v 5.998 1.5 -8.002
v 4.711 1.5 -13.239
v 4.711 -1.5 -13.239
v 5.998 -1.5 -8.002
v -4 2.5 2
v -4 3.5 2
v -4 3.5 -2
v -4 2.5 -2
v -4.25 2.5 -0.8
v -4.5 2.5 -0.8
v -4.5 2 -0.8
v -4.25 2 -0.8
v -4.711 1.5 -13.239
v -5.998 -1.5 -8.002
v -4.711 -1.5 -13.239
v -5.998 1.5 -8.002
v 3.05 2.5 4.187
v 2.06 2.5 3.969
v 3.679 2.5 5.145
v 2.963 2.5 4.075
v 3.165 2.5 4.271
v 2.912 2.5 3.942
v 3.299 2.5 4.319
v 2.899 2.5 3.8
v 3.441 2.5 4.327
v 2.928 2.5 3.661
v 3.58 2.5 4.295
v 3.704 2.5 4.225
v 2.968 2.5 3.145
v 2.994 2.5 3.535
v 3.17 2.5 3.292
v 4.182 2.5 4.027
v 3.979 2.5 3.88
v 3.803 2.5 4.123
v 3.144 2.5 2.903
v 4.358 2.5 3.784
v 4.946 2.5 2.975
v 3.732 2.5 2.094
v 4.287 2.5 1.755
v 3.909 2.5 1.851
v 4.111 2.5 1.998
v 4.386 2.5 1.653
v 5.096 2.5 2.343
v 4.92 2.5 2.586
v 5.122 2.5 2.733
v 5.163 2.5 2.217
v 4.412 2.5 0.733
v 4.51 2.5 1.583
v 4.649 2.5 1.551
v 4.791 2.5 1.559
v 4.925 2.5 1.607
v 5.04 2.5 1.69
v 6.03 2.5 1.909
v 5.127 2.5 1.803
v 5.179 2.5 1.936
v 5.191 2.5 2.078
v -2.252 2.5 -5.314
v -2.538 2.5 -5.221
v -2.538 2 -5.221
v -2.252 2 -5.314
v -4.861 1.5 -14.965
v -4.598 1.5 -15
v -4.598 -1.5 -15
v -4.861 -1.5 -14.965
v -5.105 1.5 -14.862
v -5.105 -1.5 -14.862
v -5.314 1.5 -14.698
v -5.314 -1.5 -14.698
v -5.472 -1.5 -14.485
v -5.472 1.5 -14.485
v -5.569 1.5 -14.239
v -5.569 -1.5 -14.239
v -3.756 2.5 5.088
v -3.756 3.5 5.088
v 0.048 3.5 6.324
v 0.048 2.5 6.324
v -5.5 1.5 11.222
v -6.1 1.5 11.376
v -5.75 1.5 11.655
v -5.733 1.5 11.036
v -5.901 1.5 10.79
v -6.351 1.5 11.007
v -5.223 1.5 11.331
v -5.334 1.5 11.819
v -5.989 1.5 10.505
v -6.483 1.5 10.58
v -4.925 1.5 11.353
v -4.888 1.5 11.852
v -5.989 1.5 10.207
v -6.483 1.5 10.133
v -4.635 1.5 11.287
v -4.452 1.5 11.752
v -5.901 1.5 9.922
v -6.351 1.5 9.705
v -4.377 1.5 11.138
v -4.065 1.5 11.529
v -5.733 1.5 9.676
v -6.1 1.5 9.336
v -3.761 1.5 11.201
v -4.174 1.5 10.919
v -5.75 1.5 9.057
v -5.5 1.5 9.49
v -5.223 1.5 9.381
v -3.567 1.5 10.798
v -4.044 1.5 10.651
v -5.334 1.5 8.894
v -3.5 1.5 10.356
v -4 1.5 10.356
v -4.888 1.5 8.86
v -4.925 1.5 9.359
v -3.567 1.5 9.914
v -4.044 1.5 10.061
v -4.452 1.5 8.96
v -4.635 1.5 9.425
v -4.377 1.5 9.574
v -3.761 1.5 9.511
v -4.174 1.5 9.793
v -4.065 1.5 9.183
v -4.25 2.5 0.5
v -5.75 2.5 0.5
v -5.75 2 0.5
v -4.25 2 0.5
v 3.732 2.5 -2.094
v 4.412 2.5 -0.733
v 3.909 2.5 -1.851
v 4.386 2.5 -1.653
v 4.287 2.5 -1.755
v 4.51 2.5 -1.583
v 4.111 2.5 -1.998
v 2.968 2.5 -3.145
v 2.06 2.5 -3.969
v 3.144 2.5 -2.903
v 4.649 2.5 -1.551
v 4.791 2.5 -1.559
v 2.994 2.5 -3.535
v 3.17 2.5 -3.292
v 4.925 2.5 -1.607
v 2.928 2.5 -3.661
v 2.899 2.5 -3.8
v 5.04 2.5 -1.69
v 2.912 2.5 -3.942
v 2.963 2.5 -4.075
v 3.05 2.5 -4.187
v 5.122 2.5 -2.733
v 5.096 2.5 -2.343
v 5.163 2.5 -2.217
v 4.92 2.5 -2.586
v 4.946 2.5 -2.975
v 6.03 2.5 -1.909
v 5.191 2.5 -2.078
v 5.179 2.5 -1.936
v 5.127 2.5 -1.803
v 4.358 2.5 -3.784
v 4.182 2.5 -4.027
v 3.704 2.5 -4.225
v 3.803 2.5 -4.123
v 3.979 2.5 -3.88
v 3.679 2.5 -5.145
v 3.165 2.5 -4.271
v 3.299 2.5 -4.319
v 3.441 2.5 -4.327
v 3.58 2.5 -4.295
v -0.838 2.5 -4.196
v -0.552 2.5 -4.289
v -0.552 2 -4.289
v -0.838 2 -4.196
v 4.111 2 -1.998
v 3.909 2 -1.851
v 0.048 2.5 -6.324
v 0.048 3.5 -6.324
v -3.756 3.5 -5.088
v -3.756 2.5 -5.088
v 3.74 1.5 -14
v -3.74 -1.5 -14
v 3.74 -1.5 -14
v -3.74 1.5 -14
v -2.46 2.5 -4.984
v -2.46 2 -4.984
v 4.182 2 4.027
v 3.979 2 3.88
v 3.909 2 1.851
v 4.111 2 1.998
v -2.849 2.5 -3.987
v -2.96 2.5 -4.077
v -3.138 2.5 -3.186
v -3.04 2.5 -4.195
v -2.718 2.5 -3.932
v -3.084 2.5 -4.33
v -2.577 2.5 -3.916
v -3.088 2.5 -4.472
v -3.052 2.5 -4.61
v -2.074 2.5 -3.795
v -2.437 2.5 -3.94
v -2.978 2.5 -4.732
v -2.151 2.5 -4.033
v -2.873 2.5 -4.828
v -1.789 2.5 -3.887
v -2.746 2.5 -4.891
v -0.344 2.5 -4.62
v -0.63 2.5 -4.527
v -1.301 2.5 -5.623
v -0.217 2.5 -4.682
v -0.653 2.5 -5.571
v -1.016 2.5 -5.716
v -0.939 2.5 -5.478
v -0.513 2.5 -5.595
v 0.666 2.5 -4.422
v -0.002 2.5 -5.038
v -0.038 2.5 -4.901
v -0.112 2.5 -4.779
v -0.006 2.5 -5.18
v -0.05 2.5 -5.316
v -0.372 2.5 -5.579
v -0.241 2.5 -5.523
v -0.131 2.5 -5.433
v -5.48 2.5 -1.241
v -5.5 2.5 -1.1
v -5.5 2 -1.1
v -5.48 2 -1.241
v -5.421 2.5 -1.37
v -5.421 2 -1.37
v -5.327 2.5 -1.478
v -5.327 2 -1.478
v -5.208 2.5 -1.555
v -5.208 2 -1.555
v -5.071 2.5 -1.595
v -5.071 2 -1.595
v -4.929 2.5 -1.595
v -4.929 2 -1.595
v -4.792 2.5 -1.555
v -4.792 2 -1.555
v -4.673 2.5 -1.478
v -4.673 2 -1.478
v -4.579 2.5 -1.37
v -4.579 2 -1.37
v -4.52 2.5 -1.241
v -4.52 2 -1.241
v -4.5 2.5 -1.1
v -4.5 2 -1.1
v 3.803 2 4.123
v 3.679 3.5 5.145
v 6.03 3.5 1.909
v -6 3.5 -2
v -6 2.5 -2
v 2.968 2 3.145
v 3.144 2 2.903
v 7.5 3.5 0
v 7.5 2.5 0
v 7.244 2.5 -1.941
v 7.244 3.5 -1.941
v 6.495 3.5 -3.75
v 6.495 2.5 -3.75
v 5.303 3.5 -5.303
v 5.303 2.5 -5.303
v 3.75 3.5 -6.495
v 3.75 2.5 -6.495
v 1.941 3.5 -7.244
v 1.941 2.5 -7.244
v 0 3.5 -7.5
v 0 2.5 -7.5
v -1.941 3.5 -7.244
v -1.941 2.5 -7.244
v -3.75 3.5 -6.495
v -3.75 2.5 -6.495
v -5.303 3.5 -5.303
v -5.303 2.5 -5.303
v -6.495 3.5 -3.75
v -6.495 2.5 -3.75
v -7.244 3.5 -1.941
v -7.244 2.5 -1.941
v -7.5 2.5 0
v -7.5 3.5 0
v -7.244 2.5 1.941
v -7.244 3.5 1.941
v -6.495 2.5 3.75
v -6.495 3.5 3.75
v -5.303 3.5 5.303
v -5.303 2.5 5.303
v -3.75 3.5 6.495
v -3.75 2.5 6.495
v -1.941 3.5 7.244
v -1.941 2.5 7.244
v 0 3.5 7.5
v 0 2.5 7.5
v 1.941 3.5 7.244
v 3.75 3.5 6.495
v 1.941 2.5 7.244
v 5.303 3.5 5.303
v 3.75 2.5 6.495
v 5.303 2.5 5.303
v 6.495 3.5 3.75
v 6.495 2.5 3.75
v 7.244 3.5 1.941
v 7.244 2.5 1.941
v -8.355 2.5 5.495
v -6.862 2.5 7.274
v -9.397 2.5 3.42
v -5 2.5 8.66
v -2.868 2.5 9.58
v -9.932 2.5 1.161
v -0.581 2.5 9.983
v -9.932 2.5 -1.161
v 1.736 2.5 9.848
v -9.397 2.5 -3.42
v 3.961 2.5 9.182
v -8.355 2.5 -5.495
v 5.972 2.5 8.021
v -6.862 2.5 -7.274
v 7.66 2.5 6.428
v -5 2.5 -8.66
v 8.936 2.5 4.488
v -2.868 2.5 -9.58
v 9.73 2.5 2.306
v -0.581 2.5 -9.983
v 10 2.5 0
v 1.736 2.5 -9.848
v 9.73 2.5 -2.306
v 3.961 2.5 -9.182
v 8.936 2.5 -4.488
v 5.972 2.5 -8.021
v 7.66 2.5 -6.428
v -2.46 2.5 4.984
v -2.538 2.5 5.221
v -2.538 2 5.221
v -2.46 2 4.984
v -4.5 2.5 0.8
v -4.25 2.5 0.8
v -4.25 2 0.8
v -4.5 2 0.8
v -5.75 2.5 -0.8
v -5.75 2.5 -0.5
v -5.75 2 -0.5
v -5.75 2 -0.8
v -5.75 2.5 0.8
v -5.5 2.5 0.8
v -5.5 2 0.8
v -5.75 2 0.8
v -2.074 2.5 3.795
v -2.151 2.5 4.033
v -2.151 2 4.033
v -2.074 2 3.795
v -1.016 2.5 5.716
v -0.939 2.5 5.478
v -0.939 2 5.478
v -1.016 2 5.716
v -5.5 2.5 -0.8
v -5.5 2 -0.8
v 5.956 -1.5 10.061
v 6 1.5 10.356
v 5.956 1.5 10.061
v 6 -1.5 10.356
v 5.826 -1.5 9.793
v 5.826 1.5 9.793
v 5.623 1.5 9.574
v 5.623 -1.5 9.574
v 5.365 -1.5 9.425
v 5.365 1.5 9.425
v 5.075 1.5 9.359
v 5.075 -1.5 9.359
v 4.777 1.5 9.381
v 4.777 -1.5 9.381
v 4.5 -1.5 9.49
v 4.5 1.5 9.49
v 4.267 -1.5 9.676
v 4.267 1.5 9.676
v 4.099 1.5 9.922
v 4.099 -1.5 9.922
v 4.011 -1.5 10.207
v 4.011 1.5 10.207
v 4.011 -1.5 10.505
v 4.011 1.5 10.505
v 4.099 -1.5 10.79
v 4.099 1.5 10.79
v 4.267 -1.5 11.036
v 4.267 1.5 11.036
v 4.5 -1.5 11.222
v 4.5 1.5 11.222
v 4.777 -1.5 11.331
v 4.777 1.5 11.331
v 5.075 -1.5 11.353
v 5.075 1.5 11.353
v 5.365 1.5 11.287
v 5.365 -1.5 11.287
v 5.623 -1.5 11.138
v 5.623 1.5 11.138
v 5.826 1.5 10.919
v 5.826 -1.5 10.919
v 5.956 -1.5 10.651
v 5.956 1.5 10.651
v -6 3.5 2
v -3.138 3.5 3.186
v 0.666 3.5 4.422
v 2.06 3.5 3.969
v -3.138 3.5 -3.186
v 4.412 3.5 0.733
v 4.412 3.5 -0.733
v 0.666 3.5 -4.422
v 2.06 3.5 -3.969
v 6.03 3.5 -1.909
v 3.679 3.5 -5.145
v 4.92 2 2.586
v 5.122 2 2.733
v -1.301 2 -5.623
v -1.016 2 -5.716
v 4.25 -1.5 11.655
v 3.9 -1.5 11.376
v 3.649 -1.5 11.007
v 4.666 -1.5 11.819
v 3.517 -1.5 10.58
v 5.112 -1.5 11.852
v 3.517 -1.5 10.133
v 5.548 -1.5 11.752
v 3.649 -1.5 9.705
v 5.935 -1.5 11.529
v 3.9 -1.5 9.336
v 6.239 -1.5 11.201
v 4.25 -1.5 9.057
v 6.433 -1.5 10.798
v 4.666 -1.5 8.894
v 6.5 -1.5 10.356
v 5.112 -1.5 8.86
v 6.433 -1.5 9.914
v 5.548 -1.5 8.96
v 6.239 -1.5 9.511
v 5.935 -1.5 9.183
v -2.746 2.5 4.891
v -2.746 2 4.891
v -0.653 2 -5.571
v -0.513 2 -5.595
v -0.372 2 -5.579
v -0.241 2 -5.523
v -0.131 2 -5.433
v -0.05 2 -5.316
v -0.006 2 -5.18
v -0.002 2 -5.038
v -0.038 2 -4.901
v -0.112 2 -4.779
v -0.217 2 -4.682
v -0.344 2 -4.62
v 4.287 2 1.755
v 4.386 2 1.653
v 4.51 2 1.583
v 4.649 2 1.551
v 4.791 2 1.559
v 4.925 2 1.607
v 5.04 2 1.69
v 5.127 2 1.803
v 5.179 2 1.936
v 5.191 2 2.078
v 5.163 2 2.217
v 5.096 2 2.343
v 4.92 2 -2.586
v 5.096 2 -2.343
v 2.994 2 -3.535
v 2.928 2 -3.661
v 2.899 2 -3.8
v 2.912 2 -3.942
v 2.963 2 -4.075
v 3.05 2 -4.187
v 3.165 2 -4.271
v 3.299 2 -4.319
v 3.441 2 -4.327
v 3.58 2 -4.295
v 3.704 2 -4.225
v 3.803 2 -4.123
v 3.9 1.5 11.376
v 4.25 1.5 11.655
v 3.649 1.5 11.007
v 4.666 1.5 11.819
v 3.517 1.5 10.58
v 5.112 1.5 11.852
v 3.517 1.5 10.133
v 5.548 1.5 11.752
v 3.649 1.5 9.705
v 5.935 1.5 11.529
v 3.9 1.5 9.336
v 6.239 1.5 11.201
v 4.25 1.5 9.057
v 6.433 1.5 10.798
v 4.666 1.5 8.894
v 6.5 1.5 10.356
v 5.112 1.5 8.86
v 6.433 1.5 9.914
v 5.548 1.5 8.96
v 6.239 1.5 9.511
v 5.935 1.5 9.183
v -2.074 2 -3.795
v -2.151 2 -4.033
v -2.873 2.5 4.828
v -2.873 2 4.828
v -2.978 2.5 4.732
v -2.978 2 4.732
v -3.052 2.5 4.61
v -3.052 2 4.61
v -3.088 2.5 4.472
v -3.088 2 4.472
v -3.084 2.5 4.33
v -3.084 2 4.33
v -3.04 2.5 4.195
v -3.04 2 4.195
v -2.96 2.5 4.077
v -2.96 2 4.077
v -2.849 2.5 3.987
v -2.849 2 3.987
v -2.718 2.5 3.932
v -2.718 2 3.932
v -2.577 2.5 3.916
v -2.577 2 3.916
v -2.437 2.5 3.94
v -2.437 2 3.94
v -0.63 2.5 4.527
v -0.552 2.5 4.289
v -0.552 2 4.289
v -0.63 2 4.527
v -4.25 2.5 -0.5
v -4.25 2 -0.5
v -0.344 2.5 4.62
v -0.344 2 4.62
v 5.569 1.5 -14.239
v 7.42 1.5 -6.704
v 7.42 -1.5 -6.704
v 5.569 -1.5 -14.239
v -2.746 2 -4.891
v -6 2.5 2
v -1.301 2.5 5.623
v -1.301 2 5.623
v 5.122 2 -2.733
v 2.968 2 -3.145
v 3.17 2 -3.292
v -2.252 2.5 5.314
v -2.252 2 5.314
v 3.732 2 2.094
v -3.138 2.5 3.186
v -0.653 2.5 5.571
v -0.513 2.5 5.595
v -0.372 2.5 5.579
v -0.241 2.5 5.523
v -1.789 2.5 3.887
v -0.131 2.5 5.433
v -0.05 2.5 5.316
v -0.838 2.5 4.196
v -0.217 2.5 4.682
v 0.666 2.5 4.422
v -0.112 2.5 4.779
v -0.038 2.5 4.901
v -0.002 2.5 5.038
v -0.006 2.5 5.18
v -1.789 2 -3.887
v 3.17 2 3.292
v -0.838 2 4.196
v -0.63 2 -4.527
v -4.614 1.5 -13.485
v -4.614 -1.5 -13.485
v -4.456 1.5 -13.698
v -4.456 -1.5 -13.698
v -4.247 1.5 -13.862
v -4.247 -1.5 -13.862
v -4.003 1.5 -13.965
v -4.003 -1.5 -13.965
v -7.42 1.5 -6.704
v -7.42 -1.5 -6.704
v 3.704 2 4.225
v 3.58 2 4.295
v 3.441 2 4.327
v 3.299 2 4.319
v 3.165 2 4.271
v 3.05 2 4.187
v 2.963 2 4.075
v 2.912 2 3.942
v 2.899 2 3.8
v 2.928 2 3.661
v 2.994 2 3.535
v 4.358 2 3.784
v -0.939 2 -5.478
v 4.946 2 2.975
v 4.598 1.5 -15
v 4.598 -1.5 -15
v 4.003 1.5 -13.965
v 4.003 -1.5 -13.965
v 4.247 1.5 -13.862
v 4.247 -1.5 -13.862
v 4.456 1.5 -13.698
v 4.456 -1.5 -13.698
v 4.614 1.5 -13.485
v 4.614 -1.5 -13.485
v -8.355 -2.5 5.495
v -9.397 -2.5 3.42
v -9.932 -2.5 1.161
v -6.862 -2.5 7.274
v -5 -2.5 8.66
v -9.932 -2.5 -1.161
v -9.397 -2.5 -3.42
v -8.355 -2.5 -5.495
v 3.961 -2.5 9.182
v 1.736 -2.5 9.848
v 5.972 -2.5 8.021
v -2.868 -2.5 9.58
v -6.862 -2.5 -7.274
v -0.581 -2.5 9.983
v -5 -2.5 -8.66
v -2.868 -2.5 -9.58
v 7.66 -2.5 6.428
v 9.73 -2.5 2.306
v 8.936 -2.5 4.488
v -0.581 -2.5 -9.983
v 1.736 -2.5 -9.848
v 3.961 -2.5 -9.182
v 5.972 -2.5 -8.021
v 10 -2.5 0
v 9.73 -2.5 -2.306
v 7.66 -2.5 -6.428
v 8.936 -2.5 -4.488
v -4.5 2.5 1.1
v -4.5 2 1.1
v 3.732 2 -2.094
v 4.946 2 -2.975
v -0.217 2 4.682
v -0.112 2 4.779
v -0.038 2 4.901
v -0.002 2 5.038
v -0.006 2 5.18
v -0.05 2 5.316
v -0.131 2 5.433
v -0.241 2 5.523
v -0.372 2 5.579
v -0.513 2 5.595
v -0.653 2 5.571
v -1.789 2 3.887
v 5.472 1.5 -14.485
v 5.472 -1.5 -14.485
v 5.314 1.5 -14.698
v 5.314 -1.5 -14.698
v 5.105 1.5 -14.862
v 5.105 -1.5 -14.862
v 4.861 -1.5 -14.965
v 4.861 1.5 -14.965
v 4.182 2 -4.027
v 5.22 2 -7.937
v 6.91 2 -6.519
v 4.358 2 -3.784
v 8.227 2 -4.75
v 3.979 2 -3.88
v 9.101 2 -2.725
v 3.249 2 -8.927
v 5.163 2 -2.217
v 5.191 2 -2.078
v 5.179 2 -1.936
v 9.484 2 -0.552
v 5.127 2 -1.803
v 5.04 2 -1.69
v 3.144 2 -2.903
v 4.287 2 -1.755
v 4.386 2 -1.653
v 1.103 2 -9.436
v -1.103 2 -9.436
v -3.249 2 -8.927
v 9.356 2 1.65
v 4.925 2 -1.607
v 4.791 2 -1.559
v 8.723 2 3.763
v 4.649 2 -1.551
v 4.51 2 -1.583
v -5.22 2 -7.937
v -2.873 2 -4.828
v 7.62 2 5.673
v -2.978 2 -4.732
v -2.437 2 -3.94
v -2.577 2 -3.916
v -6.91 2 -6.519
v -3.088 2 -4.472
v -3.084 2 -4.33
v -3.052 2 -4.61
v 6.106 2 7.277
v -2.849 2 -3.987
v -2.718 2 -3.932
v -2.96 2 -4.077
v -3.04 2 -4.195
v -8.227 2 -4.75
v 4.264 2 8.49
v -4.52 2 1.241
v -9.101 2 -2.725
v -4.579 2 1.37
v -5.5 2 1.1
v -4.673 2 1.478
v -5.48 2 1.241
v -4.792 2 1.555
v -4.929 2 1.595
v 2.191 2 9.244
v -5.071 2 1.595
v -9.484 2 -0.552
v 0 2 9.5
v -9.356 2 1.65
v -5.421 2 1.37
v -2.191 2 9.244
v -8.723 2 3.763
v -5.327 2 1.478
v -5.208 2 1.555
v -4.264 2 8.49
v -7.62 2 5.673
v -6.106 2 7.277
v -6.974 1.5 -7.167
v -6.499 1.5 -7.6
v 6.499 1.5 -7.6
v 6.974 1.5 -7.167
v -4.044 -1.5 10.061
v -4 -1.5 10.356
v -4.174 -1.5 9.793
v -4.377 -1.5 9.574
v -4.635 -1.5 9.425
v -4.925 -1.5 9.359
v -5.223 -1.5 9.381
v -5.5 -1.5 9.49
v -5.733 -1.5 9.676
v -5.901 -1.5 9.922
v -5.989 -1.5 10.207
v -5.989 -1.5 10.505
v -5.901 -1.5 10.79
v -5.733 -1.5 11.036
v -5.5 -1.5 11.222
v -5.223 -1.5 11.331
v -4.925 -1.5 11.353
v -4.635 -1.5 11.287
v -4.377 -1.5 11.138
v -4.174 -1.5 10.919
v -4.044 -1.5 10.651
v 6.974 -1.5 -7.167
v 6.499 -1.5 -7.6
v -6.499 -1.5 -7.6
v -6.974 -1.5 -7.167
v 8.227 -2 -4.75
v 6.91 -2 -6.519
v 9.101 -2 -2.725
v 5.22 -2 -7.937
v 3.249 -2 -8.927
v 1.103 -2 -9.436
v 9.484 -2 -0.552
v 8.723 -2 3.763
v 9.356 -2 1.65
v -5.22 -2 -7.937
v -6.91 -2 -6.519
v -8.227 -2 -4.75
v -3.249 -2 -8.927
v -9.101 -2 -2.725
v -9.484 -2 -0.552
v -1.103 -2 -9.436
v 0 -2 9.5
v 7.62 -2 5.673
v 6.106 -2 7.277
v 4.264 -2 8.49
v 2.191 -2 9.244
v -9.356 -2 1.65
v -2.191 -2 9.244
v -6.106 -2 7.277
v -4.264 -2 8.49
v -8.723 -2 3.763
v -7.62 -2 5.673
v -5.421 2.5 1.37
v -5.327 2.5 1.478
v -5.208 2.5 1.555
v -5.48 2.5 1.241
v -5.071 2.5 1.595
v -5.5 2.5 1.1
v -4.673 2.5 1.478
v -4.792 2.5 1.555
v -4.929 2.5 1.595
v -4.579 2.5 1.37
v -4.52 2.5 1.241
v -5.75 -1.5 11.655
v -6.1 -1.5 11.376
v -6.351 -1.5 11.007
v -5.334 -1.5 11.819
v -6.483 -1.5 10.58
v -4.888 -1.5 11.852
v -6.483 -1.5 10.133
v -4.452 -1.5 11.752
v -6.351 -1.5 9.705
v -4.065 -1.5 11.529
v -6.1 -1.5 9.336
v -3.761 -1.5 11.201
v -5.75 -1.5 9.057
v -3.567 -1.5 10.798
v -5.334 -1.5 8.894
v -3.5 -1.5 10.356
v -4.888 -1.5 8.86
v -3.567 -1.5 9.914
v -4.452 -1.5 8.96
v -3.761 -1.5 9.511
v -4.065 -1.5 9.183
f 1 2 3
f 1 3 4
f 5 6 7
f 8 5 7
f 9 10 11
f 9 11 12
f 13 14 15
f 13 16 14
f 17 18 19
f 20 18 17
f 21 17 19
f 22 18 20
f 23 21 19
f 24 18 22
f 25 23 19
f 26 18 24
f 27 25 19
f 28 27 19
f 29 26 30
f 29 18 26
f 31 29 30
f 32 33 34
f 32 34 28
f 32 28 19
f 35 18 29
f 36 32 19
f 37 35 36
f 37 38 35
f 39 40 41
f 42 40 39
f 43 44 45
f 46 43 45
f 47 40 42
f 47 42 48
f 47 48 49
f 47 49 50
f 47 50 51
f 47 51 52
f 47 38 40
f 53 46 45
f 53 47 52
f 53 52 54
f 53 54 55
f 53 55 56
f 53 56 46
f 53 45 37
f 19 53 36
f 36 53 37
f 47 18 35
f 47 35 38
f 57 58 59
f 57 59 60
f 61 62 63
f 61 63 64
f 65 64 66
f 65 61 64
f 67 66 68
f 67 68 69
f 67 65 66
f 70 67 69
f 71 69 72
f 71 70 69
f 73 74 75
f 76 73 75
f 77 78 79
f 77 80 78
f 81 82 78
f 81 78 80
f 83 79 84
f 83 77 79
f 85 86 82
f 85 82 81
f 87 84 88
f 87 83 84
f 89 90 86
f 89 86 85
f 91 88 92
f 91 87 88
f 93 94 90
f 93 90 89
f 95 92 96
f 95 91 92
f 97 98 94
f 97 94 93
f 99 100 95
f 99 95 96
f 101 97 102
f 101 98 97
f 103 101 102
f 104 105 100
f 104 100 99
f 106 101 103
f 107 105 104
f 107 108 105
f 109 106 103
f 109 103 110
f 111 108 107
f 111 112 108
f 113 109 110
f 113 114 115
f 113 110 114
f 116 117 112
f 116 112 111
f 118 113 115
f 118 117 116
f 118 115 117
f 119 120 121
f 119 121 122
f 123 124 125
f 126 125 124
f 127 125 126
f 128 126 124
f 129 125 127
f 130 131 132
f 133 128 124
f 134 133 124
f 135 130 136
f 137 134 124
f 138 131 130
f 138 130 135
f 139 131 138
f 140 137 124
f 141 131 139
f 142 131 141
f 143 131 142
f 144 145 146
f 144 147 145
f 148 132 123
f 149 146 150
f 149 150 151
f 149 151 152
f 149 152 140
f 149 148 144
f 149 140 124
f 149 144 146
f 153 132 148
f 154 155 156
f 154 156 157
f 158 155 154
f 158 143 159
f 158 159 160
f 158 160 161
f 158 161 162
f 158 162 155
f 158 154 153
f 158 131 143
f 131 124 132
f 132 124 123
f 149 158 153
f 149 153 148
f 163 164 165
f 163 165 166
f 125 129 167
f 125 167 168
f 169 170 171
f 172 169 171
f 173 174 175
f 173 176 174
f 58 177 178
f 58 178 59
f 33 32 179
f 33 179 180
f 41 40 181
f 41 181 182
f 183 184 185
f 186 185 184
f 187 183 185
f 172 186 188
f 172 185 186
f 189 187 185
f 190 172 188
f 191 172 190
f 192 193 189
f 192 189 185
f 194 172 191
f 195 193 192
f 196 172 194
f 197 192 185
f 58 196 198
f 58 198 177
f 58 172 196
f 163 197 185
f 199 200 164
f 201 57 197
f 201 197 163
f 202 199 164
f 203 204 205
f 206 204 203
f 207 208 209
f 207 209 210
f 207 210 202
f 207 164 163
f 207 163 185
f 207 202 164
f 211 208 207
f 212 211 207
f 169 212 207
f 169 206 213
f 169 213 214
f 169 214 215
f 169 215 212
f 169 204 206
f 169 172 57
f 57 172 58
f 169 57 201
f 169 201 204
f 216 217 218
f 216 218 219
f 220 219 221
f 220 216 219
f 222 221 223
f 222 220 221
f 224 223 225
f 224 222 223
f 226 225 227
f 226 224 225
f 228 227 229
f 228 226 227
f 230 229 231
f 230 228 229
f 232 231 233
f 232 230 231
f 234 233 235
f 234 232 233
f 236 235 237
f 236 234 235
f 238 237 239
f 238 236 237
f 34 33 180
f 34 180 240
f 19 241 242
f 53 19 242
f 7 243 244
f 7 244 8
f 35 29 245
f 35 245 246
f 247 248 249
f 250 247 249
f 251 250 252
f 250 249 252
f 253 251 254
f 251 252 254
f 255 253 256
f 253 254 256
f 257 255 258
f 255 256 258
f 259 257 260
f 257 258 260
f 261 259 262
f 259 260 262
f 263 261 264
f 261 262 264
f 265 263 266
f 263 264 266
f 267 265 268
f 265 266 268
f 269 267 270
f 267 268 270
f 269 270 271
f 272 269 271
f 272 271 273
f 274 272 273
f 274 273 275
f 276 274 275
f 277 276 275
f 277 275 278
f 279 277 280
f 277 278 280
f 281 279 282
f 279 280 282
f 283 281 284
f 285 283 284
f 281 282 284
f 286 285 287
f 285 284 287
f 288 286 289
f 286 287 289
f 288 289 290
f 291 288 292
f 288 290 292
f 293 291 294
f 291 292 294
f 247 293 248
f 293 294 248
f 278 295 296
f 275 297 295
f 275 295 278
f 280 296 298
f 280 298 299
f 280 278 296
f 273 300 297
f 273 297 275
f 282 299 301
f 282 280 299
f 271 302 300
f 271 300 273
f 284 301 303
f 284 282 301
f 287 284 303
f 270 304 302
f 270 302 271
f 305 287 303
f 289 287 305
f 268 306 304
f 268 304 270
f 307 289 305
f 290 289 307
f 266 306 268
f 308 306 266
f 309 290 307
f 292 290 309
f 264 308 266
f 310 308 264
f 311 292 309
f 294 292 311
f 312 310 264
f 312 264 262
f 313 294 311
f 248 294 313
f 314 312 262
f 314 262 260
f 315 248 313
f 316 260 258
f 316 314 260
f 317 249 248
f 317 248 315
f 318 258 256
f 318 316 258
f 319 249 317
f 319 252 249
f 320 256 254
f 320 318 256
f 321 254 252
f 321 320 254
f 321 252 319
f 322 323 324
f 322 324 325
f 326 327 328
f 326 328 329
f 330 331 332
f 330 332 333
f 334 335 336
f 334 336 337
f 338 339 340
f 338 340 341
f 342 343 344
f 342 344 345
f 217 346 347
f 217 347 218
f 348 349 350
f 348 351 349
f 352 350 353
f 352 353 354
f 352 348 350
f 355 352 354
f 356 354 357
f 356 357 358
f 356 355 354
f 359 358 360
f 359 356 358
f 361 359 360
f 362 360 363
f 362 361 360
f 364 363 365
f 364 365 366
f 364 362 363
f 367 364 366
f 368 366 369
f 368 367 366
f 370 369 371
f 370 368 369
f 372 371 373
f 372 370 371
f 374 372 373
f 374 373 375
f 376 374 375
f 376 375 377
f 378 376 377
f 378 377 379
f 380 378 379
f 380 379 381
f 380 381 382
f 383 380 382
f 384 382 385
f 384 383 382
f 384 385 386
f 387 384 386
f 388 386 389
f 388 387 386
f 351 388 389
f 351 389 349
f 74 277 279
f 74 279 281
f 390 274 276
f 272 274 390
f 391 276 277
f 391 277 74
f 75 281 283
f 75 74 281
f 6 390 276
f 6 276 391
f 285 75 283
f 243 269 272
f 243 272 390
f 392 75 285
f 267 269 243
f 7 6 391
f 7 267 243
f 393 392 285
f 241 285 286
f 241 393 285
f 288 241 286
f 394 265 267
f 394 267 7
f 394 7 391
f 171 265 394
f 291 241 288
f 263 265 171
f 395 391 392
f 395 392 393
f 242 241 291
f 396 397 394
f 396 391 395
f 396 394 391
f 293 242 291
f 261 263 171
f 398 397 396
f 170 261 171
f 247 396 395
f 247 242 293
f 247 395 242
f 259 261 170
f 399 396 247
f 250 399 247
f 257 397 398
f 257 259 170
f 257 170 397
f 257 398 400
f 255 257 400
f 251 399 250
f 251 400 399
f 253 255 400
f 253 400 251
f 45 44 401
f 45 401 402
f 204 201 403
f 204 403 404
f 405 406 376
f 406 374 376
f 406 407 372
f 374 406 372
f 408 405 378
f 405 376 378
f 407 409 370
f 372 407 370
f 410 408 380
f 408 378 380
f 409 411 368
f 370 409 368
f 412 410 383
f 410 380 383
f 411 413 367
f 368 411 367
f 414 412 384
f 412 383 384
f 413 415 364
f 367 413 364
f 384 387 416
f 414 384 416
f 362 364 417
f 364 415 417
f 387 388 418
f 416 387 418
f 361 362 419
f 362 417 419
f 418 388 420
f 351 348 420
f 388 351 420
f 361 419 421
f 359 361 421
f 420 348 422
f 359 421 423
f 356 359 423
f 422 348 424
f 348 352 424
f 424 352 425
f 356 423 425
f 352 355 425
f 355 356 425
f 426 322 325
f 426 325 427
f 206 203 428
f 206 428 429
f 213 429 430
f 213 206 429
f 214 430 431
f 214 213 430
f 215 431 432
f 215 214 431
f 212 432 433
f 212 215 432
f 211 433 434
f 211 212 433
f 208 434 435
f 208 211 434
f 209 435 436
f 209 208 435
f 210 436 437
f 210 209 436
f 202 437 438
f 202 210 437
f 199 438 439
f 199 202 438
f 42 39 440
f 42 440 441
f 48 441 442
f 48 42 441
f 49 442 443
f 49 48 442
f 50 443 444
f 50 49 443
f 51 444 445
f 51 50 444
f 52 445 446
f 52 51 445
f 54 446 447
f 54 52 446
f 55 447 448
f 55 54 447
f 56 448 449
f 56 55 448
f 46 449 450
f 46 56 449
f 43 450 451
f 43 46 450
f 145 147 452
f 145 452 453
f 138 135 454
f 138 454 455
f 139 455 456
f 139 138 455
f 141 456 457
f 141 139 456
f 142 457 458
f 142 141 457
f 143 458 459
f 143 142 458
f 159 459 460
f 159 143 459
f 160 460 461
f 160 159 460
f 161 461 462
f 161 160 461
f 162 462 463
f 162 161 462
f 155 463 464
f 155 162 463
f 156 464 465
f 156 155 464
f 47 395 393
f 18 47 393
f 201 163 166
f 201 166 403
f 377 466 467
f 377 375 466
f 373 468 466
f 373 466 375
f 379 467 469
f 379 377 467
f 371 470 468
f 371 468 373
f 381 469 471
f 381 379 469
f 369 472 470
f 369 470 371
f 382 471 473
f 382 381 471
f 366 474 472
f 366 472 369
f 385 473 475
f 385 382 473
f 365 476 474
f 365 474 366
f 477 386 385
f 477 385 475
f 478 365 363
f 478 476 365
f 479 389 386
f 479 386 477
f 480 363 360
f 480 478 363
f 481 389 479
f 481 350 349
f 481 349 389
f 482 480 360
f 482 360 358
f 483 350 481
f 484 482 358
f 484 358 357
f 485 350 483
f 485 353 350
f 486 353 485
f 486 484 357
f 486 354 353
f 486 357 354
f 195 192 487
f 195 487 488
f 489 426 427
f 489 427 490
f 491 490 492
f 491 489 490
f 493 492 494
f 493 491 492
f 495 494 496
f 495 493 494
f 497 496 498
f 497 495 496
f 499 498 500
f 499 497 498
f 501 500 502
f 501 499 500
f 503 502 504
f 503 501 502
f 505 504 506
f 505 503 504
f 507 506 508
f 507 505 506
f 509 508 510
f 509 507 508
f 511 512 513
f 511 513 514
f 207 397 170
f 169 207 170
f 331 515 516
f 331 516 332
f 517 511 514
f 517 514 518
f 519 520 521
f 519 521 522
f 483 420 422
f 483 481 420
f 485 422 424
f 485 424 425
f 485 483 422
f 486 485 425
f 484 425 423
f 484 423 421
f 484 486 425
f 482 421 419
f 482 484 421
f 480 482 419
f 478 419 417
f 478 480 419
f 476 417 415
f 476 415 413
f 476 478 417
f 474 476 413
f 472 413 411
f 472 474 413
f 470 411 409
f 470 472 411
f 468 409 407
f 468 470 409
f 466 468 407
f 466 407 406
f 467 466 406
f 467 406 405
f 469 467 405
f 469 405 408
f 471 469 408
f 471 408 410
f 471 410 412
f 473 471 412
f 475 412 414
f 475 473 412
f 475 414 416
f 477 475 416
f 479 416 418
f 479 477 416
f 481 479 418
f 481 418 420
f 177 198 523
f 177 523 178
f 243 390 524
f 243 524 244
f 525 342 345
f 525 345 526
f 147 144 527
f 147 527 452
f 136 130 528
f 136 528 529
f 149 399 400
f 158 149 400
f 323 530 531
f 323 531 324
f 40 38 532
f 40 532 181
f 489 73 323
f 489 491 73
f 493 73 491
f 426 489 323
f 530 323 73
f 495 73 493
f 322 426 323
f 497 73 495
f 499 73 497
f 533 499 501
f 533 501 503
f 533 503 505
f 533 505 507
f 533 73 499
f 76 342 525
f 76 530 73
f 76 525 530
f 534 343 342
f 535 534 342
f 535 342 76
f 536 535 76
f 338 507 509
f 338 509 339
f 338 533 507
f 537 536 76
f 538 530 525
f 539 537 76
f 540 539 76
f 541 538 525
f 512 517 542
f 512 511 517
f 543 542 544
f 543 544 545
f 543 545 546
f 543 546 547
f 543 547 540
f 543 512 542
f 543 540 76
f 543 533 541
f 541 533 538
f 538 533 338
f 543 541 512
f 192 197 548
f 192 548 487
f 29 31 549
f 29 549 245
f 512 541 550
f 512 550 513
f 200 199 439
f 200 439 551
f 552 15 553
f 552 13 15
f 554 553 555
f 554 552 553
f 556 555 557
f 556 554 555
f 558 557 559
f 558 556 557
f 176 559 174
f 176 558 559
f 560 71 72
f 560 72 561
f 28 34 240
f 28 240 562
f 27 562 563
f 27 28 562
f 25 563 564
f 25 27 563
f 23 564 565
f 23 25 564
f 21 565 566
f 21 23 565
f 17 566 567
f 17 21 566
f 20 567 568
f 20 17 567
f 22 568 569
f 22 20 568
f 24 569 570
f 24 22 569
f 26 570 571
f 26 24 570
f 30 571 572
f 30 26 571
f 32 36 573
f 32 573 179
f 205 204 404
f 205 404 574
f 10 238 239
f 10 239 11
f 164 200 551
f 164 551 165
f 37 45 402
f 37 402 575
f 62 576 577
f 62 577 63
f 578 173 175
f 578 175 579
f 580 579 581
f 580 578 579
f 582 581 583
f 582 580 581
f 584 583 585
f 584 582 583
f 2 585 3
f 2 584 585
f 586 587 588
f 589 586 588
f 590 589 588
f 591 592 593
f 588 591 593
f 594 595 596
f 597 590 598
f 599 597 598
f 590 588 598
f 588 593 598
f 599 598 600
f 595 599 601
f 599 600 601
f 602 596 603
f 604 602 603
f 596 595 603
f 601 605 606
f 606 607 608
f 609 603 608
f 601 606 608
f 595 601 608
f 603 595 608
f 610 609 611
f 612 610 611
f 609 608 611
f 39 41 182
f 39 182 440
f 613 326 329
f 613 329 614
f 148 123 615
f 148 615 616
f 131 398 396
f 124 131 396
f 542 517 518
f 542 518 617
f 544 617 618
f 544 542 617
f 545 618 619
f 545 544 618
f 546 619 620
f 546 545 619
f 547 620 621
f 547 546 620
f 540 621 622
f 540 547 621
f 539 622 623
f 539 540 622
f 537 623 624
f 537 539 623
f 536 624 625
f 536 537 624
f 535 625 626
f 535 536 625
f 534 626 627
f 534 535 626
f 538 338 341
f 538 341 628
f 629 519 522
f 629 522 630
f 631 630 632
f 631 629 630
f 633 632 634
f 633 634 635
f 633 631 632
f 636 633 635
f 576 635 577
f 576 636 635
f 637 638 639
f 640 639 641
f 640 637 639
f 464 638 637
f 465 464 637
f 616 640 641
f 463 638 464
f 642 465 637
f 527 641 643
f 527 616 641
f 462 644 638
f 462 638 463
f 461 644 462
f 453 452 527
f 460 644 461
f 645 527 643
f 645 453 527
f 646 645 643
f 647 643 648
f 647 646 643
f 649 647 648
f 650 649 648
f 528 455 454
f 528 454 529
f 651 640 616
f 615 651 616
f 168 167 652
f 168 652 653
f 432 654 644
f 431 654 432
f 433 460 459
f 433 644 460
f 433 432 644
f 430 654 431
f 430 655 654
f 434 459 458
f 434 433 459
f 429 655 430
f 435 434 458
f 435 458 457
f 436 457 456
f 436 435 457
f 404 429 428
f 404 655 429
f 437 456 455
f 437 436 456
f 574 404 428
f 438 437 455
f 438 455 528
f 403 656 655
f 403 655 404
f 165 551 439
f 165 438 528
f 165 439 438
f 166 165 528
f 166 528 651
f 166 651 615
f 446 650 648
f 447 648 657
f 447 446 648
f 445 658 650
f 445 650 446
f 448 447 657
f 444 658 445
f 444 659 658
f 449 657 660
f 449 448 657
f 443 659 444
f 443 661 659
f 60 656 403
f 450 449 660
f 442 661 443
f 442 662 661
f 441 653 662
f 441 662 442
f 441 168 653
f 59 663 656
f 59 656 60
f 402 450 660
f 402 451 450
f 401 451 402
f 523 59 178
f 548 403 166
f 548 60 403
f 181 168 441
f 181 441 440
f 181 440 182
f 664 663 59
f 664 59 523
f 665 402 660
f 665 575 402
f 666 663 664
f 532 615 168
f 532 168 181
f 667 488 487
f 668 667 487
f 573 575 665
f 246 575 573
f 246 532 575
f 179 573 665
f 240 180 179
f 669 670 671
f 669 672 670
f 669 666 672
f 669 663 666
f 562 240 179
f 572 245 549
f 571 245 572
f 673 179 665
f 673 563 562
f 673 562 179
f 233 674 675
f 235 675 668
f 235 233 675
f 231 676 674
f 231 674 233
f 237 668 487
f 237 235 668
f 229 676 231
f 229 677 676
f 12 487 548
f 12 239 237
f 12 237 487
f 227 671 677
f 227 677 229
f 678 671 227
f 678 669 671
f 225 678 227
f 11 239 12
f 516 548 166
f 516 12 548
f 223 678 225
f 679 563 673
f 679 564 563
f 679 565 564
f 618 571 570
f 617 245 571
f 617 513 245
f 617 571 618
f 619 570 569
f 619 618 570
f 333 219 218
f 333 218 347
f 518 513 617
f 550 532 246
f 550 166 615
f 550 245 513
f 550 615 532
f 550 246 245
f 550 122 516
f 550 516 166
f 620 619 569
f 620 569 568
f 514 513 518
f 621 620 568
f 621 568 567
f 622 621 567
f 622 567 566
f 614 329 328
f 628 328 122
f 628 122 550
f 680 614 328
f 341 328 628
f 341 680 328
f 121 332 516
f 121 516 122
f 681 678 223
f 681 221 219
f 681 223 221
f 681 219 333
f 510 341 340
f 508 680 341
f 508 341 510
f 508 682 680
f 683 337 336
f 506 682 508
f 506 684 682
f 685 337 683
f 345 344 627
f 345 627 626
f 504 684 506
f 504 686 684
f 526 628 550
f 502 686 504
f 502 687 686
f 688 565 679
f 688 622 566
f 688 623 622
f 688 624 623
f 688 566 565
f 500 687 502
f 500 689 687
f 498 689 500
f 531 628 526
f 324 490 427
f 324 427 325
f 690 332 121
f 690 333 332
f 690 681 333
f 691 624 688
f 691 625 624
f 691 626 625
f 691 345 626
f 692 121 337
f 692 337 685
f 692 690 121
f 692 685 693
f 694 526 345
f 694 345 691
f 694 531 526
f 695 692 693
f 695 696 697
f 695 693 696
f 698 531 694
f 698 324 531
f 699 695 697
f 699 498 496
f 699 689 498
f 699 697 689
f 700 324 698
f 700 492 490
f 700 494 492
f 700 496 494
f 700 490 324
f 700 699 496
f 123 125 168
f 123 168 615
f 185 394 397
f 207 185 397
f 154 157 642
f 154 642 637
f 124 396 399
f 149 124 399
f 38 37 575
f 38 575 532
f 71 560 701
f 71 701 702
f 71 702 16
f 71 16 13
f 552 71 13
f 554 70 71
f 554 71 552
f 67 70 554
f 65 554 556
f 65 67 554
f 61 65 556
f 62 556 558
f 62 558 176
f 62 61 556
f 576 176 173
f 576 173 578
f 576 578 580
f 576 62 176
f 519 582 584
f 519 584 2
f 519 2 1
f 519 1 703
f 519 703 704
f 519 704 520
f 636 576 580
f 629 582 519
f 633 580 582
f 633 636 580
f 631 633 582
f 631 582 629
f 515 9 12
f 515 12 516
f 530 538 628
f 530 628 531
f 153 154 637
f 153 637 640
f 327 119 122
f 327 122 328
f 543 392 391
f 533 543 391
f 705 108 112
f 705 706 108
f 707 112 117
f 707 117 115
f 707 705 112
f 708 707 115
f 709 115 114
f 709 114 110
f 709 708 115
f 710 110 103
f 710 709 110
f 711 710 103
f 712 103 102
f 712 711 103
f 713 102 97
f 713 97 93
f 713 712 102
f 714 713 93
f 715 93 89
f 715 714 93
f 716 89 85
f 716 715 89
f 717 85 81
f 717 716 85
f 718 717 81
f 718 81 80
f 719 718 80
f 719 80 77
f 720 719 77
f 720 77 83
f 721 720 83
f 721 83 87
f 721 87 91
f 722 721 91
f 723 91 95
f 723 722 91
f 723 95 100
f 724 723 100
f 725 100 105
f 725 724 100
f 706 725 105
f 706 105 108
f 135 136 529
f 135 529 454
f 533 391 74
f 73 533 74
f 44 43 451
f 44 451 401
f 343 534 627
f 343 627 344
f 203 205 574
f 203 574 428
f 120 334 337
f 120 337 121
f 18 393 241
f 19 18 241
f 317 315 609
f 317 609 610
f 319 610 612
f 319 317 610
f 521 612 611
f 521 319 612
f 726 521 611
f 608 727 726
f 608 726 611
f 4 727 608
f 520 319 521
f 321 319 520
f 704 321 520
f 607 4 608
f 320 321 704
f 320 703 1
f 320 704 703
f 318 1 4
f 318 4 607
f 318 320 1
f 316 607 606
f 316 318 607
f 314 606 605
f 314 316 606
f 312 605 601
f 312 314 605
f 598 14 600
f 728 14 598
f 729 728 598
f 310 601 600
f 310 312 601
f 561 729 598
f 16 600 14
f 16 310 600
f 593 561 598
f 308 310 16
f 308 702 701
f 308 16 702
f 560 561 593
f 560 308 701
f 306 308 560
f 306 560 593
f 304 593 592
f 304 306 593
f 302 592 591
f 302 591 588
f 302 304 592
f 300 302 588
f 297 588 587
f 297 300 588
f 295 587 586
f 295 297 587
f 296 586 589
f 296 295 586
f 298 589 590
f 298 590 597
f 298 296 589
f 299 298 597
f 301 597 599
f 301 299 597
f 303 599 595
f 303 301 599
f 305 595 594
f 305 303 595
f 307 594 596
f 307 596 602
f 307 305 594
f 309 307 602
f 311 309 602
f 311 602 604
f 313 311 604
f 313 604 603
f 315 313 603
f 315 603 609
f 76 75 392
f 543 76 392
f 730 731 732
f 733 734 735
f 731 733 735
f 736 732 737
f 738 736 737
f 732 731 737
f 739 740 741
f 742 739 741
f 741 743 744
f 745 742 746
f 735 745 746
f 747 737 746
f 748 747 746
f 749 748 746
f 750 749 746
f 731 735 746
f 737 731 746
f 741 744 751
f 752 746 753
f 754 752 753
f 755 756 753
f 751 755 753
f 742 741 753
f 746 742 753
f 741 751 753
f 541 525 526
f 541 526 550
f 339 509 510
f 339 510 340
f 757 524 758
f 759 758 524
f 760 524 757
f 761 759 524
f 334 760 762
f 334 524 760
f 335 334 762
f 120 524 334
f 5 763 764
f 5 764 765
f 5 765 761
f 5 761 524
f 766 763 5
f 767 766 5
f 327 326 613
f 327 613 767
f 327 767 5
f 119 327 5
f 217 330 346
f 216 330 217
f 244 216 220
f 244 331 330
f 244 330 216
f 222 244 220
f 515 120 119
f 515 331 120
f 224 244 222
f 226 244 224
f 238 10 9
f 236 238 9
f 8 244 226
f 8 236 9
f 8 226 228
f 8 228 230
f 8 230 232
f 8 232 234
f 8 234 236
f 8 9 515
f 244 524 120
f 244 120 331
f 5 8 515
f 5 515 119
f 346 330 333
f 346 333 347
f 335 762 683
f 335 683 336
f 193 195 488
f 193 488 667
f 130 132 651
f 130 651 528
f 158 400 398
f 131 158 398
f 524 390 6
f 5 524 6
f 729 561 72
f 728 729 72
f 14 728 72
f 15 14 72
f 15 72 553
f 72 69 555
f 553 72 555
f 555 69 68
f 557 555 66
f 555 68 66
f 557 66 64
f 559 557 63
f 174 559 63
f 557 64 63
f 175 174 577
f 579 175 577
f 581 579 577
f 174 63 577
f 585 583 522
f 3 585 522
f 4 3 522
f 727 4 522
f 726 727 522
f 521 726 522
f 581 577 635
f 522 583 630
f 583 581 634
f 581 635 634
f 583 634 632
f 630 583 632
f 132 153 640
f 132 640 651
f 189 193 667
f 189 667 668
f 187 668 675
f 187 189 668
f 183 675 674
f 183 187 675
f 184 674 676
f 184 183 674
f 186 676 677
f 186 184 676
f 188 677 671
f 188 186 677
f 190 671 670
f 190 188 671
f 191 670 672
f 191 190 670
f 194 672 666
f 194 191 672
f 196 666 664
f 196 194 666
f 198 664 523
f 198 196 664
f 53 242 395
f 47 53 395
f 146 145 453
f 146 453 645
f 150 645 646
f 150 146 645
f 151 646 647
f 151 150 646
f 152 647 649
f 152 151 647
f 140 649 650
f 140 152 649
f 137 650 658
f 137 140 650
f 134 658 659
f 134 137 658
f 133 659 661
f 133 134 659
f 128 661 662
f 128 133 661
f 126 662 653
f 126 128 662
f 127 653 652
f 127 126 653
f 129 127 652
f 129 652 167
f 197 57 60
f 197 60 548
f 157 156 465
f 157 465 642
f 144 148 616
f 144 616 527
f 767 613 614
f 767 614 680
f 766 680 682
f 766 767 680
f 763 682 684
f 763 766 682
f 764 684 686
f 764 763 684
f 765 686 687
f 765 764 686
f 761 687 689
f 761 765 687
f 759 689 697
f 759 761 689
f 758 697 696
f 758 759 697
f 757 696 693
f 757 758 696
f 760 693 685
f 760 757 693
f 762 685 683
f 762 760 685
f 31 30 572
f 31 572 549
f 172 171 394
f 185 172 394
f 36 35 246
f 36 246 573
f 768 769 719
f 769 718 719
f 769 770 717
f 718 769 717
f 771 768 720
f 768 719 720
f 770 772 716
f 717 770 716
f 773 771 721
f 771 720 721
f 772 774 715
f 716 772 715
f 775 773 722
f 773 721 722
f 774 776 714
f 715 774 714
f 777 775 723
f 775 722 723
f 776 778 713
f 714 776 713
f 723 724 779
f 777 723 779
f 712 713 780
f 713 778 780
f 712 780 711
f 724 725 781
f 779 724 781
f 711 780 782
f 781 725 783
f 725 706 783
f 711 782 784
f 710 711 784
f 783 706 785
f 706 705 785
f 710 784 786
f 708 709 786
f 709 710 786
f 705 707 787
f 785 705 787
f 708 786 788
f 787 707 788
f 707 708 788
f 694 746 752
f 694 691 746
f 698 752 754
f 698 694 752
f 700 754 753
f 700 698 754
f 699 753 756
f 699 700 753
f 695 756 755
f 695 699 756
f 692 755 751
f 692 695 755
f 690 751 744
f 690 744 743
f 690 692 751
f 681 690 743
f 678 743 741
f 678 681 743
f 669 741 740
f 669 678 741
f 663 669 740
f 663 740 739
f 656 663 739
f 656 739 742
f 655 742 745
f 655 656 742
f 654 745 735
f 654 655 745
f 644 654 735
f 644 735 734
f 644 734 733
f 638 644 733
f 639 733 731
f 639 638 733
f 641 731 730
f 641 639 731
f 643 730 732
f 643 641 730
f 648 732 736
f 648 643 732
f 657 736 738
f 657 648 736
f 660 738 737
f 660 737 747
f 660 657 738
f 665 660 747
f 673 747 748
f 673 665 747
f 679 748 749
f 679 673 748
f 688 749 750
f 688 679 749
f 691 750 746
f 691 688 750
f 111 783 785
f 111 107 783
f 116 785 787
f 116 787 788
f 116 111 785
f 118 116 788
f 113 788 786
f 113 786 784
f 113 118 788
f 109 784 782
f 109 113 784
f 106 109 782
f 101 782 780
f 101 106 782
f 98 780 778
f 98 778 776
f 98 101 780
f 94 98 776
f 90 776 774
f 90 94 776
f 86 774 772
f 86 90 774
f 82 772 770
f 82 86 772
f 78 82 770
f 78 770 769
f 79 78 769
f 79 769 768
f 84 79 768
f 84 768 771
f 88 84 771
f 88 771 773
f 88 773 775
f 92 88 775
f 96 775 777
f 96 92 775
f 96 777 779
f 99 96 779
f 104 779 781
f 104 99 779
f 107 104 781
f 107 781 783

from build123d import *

# Parameters (mm, degrees)
SKETCH1_R             = 10
BOSS_EXTRUDE1_DEPTH   = 2.5
SKETCH1_3_R           = 1.5
SKETCH1_3_R_2         = 1
BOSS_EXTRUDE2_DEPTH   = 1.5
BOSS_EXTRUDE2_2_DEPTH = 1.5
BOSS_EXTRUDE4_DEPTH   = 1.5
SKETCH2_R             = 7.5
BOSS_EXTRUDE5_DEPTH   = 1
SKETCH4_W             = 9.5
SKETCH4_H             = 4
SKETCH3_W             = 2
SKETCH3_H             = 4
CUT_EXTRUDE5_DEPTH    = 1
CUT_EXTRUDE6_DEPTH    = 1.5


with BuildPart() as part:
    # Sketch1 → Boss-Extrude1 (new body, symmetric)
    with BuildSketch(Plane(origin=(0, 0, 0), x_dir=(1, 0, 0), z_dir=(0, 1, 0))):
        Circle(SKETCH1_R)
    extrude(amount=BOSS_EXTRUDE1_DEPTH, both=True)

    # Sketch1_7 → Boss-Extrude4 (add, symmetric)
    with BuildSketch(Plane(origin=(0, 0, 0), x_dir=(1, 0, 0), z_dir=(0, 1, 0))):
        with BuildLine():
            Line((-3.74, 14), (3.74, 14))
            ThreePointArc((3.74, 14), (4.357024903, 13.786943625), (4.711127628, 13.238560538))
            Line((4.711127628, 13.238560538), (5.997544065, 8.001841363))
            ThreePointArc((5.997544065, 8.001841363), (6.739981012, 7.387330773), (7.419814598, 6.704204005))
            Line((7.419814598, 6.704204005), (5.568976361, 14.238560538))
            ThreePointArc((5.568976361, 14.238560538), (5.214873636, 14.786943625), (4.597848733, 15))
            Line((4.597848733, 15), (-4.597848733, 15))
            ThreePointArc((-4.597848733, 15), (-5.214873636, 14.786943625), (-5.568976361, 14.238560538))
            Line((-5.568976361, 14.238560538), (-7.419814598, 6.704204005))
            ThreePointArc((-7.419814598, 6.704204005), (-6.739981012, 7.387330773), (-5.997544065, 8.001841363))
            Line((-5.997544065, 8.001841363), (-4.711127628, 13.238560538))
            ThreePointArc((-4.711127628, 13.238560538), (-4.357024903, 13.786943625), (-3.74, 14))
        make_face()
    extrude(amount=BOSS_EXTRUDE4_DEPTH, both=True)

    # Sketch2 → Boss-Extrude5 (add)
    with BuildSketch(Plane(origin=(0, 2.5, 0), x_dir=(1, 0, 0), z_dir=(0, 1, 0))):
        Circle(SKETCH2_R)
    extrude(amount=BOSS_EXTRUDE5_DEPTH)

    # Sketch4 → Cut-Revolve1 (revolve, cut)
    with BuildSketch(Plane(origin=(0, 0, 0), x_dir=(0, 0, -1), z_dir=(1, 0, 0))):
        with Locations((-4.75, 0)):
            Rectangle(SKETCH4_W, SKETCH4_H)
    revolve(axis=Axis((0, 2, 0), (0, -1, 0)), mode=Mode.SUBTRACT)

    # Sketch3 → Cut-Extrude5 (cut)
    with BuildSketch(Plane(origin=(0, 3.5, 0), x_dir=(1, 0, 0), z_dir=(0, 1, 0))):
        with Locations((-5, 0)):
            Rectangle(SKETCH3_W, SKETCH3_H)
        with BuildLine():
            ThreePointArc((-5.5, 1.1), (-5, 1.6), (-4.5, 1.1))
            Line((-4.5, 1.1), (-4.5, 0.8))
            Line((-4.5, 0.8), (-4.25, 0.8))
            Line((-4.25, 0.8), (-4.25, 0.5))
            Line((-4.25, 0.5), (-5.75, 0.5))
            Line((-5.75, 0.5), (-5.75, 0.8))
            Line((-5.75, 0.8), (-5.5, 0.8))
            Line((-5.5, 0.8), (-5.5, 1.1))
        make_face(mode=Mode.SUBTRACT)
        with BuildLine():
            Line((-5.75, -0.5), (-4.25, -0.5))
            Line((-4.25, -0.5), (-4.25, -0.8))
            Line((-4.25, -0.8), (-4.5, -0.8))
            Line((-4.5, -0.8), (-4.5, -1.1))
            ThreePointArc((-4.5, -1.1), (-5, -1.6), (-5.5, -1.1))
            Line((-5.5, -1.1), (-5.5, -0.8))
            Line((-5.5, -0.8), (-5.75, -0.8))
            Line((-5.75, -0.8), (-5.75, -0.5))
        make_face(mode=Mode.SUBTRACT)
        Polygon((-3.13818101, 3.186192076), (0.666045055, 4.422260054), (0.048011066, 6.324373087), (-3.756214999, 5.088305109), align=None)
        with BuildLine():
            ThreePointArc((-2.436738643, 3.93983563), (-3.066775398, 4.26085539), (-2.745755637, 4.890892146))
            Line((-2.745755637, 4.890892146), (-2.460438682, 4.983597244))
            Line((-2.460438682, 4.983597244), (-2.537692931, 5.221361373))
            Line((-2.537692931, 5.221361373), (-2.252375976, 5.314066472))
            Line((-2.252375976, 5.314066472), (-1.788850484, 3.887481697))
            Line((-1.788850484, 3.887481697), (-2.074167439, 3.794776599))
            Line((-2.074167439, 3.794776599), (-2.151421688, 4.032540728))
            Line((-2.151421688, 4.032540728), (-2.436738643, 3.93983563))
        make_face(mode=Mode.SUBTRACT)
        with BuildLine():
            Line((-0.344414307, 4.619673017), (-0.629731262, 4.526967919))
            Line((-0.629731262, 4.526967919), (-0.552477013, 4.28920379))
            Line((-0.552477013, 4.28920379), (-0.837793968, 4.196498691))
            Line((-0.837793968, 4.196498691), (-1.30131946, 5.623083466))
            Line((-1.30131946, 5.623083466), (-1.016002505, 5.715788564))
            Line((-1.016002505, 5.715788564), (-0.938748256, 5.478024435))
            Line((-0.938748256, 5.478024435), (-0.653431301, 5.570729533))
            ThreePointArc((-0.653431301, 5.570729533), (-0.023394546, 5.249709772), (-0.344414307, 4.619673017))
        make_face(mode=Mode.SUBTRACT)
        Polygon((-3.756214999, -5.088305109), (0.048011066, -6.324373087), (0.666045055, -4.422260054), (-3.13818101, -3.186192076), align=None)
        with BuildLine():
            ThreePointArc((-2.745755637, -4.890892146), (-3.066775398, -4.26085539), (-2.436738643, -3.93983563))
            Line((-2.436738643, -3.93983563), (-2.151421688, -4.032540728))
            Line((-2.151421688, -4.032540728), (-2.074167439, -3.794776599))
            Line((-2.074167439, -3.794776599), (-1.788850484, -3.887481697))
            Line((-1.788850484, -3.887481697), (-2.252375976, -5.314066472))
            Line((-2.252375976, -5.314066472), (-2.537692931, -5.221361373))
            Line((-2.537692931, -5.221361373), (-2.460438682, -4.983597244))
            Line((-2.460438682, -4.983597244), (-2.745755637, -4.890892146))
        make_face(mode=Mode.SUBTRACT)
        with BuildLine():
            Line((-0.653431301, -5.570729533), (-0.938748256, -5.478024435))
            Line((-0.938748256, -5.478024435), (-1.016002505, -5.715788564))
            Line((-1.016002505, -5.715788564), (-1.30131946, -5.623083466))
            Line((-1.30131946, -5.623083466), (-0.837793968, -4.196498691))
            Line((-0.837793968, -4.196498691), (-0.552477013, -4.28920379))
            Line((-0.552477013, -4.28920379), (-0.629731262, -4.526967919))
            Line((-0.629731262, -4.526967919), (-0.344414307, -4.619673017))
            ThreePointArc((-0.344414307, -4.619673017), (-0.023394546, -5.249709772), (-0.653431301, -5.570729533))
        make_face(mode=Mode.SUBTRACT)
        Polygon((2.060497473, 3.969174998), (4.411638482, 0.73310702), (6.029672471, 1.908677525), (3.678531462, 5.144745503), align=None)
        with BuildLine():
            ThreePointArc((2.994012697, 3.534952329), (3.104628568, 4.233353452), (3.803029692, 4.122737581))
            Line((3.803029692, 4.122737581), (3.979365267, 3.880032483))
            Line((3.979365267, 3.880032483), (4.181619516, 4.026978796))
            Line((4.181619516, 4.026978796), (4.357955092, 3.784273698))
            Line((4.357955092, 3.784273698), (3.1444296, 2.902595819))
            Line((3.1444296, 2.902595819), (2.968094024, 3.145300918))
            Line((2.968094024, 3.145300918), (3.170348273, 3.292247231))
            Line((3.170348273, 3.292247231), (2.994012697, 3.534952329))
        make_face(mode=Mode.SUBTRACT)
        with BuildLine():
            Line((4.287140252, 1.755114942), (4.110804677, 1.99782004))
            Line((4.110804677, 1.99782004), (3.908550428, 1.850873727))
            Line((3.908550428, 1.850873727), (3.732214852, 2.093578825))
            Line((3.732214852, 2.093578825), (4.945740344, 2.975256703))
            Line((4.945740344, 2.975256703), (5.122075919, 2.732551605))
            Line((5.122075919, 2.732551605), (4.919821671, 2.585605292))
            Line((4.919821671, 2.585605292), (5.096157247, 2.342900194))
            ThreePointArc((5.096157247, 2.342900194), (4.985541376, 1.64449907), (4.287140252, 1.755114942))
        make_face(mode=Mode.SUBTRACT)
        Polygon((3.678531462, -5.144745503), (6.029672471, -1.908677525), (4.411638482, -0.73310702), (2.060497473, -3.969174998), align=None)
        with BuildLine():
            ThreePointArc((3.803029692, -4.122737581), (3.104628568, -4.233353452), (2.994012697, -3.534952329))
            Line((2.994012697, -3.534952329), (3.170348273, -3.292247231))
            Line((3.170348273, -3.292247231), (2.968094024, -3.145300918))
            Line((2.968094024, -3.145300918), (3.1444296, -2.902595819))
            Line((3.1444296, -2.902595819), (4.357955092, -3.784273698))
            Line((4.357955092, -3.784273698), (4.181619516, -4.026978796))
            Line((4.181619516, -4.026978796), (3.979365267, -3.880032483))
            Line((3.979365267, -3.880032483), (3.803029692, -4.122737581))
        make_face(mode=Mode.SUBTRACT)
        with BuildLine():
            Line((5.096157247, -2.342900194), (4.919821671, -2.585605292))
            Line((4.919821671, -2.585605292), (5.122075919, -2.732551605))
            Line((5.122075919, -2.732551605), (4.945740344, -2.975256703))
            Line((4.945740344, -2.975256703), (3.732214852, -2.093578825))
            Line((3.732214852, -2.093578825), (3.908550428, -1.850873727))
            Line((3.908550428, -1.850873727), (4.110804677, -1.99782004))
            Line((4.110804677, -1.99782004), (4.287140252, -1.755114942))
            ThreePointArc((4.287140252, -1.755114942), (4.985541376, -1.64449907), (5.096157247, -2.342900194))
        make_face(mode=Mode.SUBTRACT)
    extrude(amount=-CUT_EXTRUDE5_DEPTH, mode=Mode.SUBTRACT)

    # Sketch3_7 → Cut-Extrude6 (cut)
    with BuildSketch(Plane(origin=(0, 3.5, 0), x_dir=(1, 0, 0), z_dir=(0, 1, 0))):
        with BuildLine():
            Line((-5.5, -0.8), (-5.75, -0.8))
            Line((-5.75, -0.8), (-5.75, -0.5))
            Line((-5.75, -0.5), (-4.25, -0.5))
            Line((-4.25, -0.5), (-4.25, -0.8))
            Line((-4.25, -0.8), (-4.5, -0.8))
            Line((-4.5, -0.8), (-4.5, -1.1))
            ThreePointArc((-4.5, -1.1), (-5, -1.6), (-5.5, -1.1))
            Line((-5.5, -1.1), (-5.5, -0.8))
        make_face()
        with BuildLine():
            Line((-4.25, 0.8), (-4.25, 0.5))
            Line((-4.25, 0.5), (-5.75, 0.5))
            Line((-5.75, 0.5), (-5.75, 0.8))
            Line((-5.75, 0.8), (-5.5, 0.8))
            Line((-5.5, 0.8), (-5.5, 1.1))
            ThreePointArc((-5.5, 1.1), (-5, 1.6), (-4.5, 1.1))
            Line((-4.5, 1.1), (-4.5, 0.8))
            Line((-4.5, 0.8), (-4.25, 0.8))
        make_face()
        with BuildLine():
            Line((-2.460438682, 4.983597244), (-2.537692931, 5.221361373))
            Line((-2.537692931, 5.221361373), (-2.252375976, 5.314066472))
            Line((-2.252375976, 5.314066472), (-1.788850484, 3.887481697))
            Line((-1.788850484, 3.887481697), (-2.074167439, 3.794776599))
            Line((-2.074167439, 3.794776599), (-2.151421688, 4.032540728))
            Line((-2.151421688, 4.032540728), (-2.436738643, 3.93983563))
            ThreePointArc((-2.436738643, 3.93983563), (-3.066775398, 4.26085539), (-2.745755637, 4.890892146))
            Line((-2.745755637, 4.890892146), (-2.460438682, 4.983597244))
        make_face()
        with BuildLine():
            Line((-0.552477013, 4.28920379), (-0.837793968, 4.196498691))
            Line((-0.837793968, 4.196498691), (-1.30131946, 5.623083466))
            Line((-1.30131946, 5.623083466), (-1.016002505, 5.715788564))
            Line((-1.016002505, 5.715788564), (-0.938748256, 5.478024435))
            Line((-0.938748256, 5.478024435), (-0.653431301, 5.570729533))
            ThreePointArc((-0.653431301, 5.570729533), (-0.023394546, 5.249709772), (-0.344414307, 4.619673017))
            Line((-0.344414307, 4.619673017), (-0.629731262, 4.526967919))
            Line((-0.629731262, 4.526967919), (-0.552477013, 4.28920379))
        make_face()
        with BuildLine():
            Line((3.979365267, 3.880032483), (4.181619516, 4.026978796))
            Line((4.181619516, 4.026978796), (4.357955092, 3.784273698))
            Line((4.357955092, 3.784273698), (3.1444296, 2.902595819))
            Line((3.1444296, 2.902595819), (2.968094024, 3.145300918))
            Line((2.968094024, 3.145300918), (3.170348273, 3.292247231))
            Line((3.170348273, 3.292247231), (2.994012697, 3.534952329))
            ThreePointArc((2.994012697, 3.534952329), (3.104628568, 4.233353452), (3.803029692, 4.122737581))
            Line((3.803029692, 4.122737581), (3.979365267, 3.880032483))
        make_face()
        with BuildLine():
            Line((3.908550428, 1.850873727), (3.732214852, 2.093578825))
            Line((3.732214852, 2.093578825), (4.945740344, 2.975256703))
            Line((4.945740344, 2.975256703), (5.122075919, 2.732551605))
            Line((5.122075919, 2.732551605), (4.919821671, 2.585605292))
            Line((4.919821671, 2.585605292), (5.096157247, 2.342900194))
            ThreePointArc((5.096157247, 2.342900194), (4.985541376, 1.64449907), (4.287140252, 1.755114942))
            Line((4.287140252, 1.755114942), (4.110804677, 1.99782004))
            Line((4.110804677, 1.99782004), (3.908550428, 1.850873727))
        make_face()
        with BuildLine():
            Line((4.919821671, -2.585605292), (5.122075919, -2.732551605))
            Line((5.122075919, -2.732551605), (4.945740344, -2.975256703))
            Line((4.945740344, -2.975256703), (3.732214852, -2.093578825))
            Line((3.732214852, -2.093578825), (3.908550428, -1.850873727))
            Line((3.908550428, -1.850873727), (4.110804677, -1.99782004))
            Line((4.110804677, -1.99782004), (4.287140252, -1.755114942))
            ThreePointArc((4.287140252, -1.755114942), (4.985541376, -1.64449907), (5.096157247, -2.342900194))
            Line((5.096157247, -2.342900194), (4.919821671, -2.585605292))
        make_face()
        with BuildLine():
            Line((2.968094024, -3.145300918), (3.1444296, -2.902595819))
            Line((3.1444296, -2.902595819), (4.357955092, -3.784273698))
            Line((4.357955092, -3.784273698), (4.181619516, -4.026978796))
            Line((4.181619516, -4.026978796), (3.979365267, -3.880032483))
            Line((3.979365267, -3.880032483), (3.803029692, -4.122737581))
            ThreePointArc((3.803029692, -4.122737581), (3.104628568, -4.233353452), (2.994012697, -3.534952329))
            Line((2.994012697, -3.534952329), (3.170348273, -3.292247231))
            Line((3.170348273, -3.292247231), (2.968094024, -3.145300918))
        make_face()
        with BuildLine():
            Line((-0.938748256, -5.478024435), (-1.016002505, -5.715788564))
            Line((-1.016002505, -5.715788564), (-1.30131946, -5.623083466))
            Line((-1.30131946, -5.623083466), (-0.837793968, -4.196498691))
            Line((-0.837793968, -4.196498691), (-0.552477013, -4.28920379))
            Line((-0.552477013, -4.28920379), (-0.629731262, -4.526967919))
            Line((-0.629731262, -4.526967919), (-0.344414307, -4.619673017))
            ThreePointArc((-0.344414307, -4.619673017), (-0.023394546, -5.249709772), (-0.653431301, -5.570729533))
            Line((-0.653431301, -5.570729533), (-0.938748256, -5.478024435))
        make_face()
        with BuildLine():
            Line((-2.074167439, -3.794776599), (-1.788850484, -3.887481697))
            Line((-1.788850484, -3.887481697), (-2.252375976, -5.314066472))
            Line((-2.252375976, -5.314066472), (-2.537692931, -5.221361373))
            Line((-2.537692931, -5.221361373), (-2.460438682, -4.983597244))
            Line((-2.460438682, -4.983597244), (-2.745755637, -4.890892146))
            ThreePointArc((-2.745755637, -4.890892146), (-3.066775398, -4.26085539), (-2.436738643, -3.93983563))
            Line((-2.436738643, -3.93983563), (-2.151421688, -4.032540728))
            Line((-2.151421688, -4.032540728), (-2.074167439, -3.794776599))
        make_face()
    extrude(amount=-CUT_EXTRUDE6_DEPTH, mode=Mode.SUBTRACT)


with BuildPart() as body_2:
    # Sketch1_3 → Boss-Extrude2 (new body, symmetric)
    with BuildSketch(Plane(origin=(0, 0, 0), x_dir=(1, 0, 0), z_dir=(0, 1, 0))):
        with Locations((-5, -10.356157589)):
            Circle(SKETCH1_3_R)
        with Locations((-5, -10.356157589)):
            Circle(SKETCH1_3_R_2, mode=Mode.SUBTRACT)
    extrude(amount=BOSS_EXTRUDE2_DEPTH, both=True)


with BuildPart() as body_3:
    # Sketch1_3 → Boss-Extrude2 2 (new body, symmetric)
    with BuildSketch(Plane(origin=(0, 0, 0), x_dir=(1, 0, 0), z_dir=(0, 1, 0))):
        with Locations((5, -10.356157589)):
            Circle(SKETCH1_3_R)
        with Locations((5, -10.356157589)):
            Circle(SKETCH1_3_R_2, mode=Mode.SUBTRACT)
    extrude(amount=BOSS_EXTRUDE2_2_DEPTH, both=True)


solid = Compound([part.part, body_2.part, body_3.part])
